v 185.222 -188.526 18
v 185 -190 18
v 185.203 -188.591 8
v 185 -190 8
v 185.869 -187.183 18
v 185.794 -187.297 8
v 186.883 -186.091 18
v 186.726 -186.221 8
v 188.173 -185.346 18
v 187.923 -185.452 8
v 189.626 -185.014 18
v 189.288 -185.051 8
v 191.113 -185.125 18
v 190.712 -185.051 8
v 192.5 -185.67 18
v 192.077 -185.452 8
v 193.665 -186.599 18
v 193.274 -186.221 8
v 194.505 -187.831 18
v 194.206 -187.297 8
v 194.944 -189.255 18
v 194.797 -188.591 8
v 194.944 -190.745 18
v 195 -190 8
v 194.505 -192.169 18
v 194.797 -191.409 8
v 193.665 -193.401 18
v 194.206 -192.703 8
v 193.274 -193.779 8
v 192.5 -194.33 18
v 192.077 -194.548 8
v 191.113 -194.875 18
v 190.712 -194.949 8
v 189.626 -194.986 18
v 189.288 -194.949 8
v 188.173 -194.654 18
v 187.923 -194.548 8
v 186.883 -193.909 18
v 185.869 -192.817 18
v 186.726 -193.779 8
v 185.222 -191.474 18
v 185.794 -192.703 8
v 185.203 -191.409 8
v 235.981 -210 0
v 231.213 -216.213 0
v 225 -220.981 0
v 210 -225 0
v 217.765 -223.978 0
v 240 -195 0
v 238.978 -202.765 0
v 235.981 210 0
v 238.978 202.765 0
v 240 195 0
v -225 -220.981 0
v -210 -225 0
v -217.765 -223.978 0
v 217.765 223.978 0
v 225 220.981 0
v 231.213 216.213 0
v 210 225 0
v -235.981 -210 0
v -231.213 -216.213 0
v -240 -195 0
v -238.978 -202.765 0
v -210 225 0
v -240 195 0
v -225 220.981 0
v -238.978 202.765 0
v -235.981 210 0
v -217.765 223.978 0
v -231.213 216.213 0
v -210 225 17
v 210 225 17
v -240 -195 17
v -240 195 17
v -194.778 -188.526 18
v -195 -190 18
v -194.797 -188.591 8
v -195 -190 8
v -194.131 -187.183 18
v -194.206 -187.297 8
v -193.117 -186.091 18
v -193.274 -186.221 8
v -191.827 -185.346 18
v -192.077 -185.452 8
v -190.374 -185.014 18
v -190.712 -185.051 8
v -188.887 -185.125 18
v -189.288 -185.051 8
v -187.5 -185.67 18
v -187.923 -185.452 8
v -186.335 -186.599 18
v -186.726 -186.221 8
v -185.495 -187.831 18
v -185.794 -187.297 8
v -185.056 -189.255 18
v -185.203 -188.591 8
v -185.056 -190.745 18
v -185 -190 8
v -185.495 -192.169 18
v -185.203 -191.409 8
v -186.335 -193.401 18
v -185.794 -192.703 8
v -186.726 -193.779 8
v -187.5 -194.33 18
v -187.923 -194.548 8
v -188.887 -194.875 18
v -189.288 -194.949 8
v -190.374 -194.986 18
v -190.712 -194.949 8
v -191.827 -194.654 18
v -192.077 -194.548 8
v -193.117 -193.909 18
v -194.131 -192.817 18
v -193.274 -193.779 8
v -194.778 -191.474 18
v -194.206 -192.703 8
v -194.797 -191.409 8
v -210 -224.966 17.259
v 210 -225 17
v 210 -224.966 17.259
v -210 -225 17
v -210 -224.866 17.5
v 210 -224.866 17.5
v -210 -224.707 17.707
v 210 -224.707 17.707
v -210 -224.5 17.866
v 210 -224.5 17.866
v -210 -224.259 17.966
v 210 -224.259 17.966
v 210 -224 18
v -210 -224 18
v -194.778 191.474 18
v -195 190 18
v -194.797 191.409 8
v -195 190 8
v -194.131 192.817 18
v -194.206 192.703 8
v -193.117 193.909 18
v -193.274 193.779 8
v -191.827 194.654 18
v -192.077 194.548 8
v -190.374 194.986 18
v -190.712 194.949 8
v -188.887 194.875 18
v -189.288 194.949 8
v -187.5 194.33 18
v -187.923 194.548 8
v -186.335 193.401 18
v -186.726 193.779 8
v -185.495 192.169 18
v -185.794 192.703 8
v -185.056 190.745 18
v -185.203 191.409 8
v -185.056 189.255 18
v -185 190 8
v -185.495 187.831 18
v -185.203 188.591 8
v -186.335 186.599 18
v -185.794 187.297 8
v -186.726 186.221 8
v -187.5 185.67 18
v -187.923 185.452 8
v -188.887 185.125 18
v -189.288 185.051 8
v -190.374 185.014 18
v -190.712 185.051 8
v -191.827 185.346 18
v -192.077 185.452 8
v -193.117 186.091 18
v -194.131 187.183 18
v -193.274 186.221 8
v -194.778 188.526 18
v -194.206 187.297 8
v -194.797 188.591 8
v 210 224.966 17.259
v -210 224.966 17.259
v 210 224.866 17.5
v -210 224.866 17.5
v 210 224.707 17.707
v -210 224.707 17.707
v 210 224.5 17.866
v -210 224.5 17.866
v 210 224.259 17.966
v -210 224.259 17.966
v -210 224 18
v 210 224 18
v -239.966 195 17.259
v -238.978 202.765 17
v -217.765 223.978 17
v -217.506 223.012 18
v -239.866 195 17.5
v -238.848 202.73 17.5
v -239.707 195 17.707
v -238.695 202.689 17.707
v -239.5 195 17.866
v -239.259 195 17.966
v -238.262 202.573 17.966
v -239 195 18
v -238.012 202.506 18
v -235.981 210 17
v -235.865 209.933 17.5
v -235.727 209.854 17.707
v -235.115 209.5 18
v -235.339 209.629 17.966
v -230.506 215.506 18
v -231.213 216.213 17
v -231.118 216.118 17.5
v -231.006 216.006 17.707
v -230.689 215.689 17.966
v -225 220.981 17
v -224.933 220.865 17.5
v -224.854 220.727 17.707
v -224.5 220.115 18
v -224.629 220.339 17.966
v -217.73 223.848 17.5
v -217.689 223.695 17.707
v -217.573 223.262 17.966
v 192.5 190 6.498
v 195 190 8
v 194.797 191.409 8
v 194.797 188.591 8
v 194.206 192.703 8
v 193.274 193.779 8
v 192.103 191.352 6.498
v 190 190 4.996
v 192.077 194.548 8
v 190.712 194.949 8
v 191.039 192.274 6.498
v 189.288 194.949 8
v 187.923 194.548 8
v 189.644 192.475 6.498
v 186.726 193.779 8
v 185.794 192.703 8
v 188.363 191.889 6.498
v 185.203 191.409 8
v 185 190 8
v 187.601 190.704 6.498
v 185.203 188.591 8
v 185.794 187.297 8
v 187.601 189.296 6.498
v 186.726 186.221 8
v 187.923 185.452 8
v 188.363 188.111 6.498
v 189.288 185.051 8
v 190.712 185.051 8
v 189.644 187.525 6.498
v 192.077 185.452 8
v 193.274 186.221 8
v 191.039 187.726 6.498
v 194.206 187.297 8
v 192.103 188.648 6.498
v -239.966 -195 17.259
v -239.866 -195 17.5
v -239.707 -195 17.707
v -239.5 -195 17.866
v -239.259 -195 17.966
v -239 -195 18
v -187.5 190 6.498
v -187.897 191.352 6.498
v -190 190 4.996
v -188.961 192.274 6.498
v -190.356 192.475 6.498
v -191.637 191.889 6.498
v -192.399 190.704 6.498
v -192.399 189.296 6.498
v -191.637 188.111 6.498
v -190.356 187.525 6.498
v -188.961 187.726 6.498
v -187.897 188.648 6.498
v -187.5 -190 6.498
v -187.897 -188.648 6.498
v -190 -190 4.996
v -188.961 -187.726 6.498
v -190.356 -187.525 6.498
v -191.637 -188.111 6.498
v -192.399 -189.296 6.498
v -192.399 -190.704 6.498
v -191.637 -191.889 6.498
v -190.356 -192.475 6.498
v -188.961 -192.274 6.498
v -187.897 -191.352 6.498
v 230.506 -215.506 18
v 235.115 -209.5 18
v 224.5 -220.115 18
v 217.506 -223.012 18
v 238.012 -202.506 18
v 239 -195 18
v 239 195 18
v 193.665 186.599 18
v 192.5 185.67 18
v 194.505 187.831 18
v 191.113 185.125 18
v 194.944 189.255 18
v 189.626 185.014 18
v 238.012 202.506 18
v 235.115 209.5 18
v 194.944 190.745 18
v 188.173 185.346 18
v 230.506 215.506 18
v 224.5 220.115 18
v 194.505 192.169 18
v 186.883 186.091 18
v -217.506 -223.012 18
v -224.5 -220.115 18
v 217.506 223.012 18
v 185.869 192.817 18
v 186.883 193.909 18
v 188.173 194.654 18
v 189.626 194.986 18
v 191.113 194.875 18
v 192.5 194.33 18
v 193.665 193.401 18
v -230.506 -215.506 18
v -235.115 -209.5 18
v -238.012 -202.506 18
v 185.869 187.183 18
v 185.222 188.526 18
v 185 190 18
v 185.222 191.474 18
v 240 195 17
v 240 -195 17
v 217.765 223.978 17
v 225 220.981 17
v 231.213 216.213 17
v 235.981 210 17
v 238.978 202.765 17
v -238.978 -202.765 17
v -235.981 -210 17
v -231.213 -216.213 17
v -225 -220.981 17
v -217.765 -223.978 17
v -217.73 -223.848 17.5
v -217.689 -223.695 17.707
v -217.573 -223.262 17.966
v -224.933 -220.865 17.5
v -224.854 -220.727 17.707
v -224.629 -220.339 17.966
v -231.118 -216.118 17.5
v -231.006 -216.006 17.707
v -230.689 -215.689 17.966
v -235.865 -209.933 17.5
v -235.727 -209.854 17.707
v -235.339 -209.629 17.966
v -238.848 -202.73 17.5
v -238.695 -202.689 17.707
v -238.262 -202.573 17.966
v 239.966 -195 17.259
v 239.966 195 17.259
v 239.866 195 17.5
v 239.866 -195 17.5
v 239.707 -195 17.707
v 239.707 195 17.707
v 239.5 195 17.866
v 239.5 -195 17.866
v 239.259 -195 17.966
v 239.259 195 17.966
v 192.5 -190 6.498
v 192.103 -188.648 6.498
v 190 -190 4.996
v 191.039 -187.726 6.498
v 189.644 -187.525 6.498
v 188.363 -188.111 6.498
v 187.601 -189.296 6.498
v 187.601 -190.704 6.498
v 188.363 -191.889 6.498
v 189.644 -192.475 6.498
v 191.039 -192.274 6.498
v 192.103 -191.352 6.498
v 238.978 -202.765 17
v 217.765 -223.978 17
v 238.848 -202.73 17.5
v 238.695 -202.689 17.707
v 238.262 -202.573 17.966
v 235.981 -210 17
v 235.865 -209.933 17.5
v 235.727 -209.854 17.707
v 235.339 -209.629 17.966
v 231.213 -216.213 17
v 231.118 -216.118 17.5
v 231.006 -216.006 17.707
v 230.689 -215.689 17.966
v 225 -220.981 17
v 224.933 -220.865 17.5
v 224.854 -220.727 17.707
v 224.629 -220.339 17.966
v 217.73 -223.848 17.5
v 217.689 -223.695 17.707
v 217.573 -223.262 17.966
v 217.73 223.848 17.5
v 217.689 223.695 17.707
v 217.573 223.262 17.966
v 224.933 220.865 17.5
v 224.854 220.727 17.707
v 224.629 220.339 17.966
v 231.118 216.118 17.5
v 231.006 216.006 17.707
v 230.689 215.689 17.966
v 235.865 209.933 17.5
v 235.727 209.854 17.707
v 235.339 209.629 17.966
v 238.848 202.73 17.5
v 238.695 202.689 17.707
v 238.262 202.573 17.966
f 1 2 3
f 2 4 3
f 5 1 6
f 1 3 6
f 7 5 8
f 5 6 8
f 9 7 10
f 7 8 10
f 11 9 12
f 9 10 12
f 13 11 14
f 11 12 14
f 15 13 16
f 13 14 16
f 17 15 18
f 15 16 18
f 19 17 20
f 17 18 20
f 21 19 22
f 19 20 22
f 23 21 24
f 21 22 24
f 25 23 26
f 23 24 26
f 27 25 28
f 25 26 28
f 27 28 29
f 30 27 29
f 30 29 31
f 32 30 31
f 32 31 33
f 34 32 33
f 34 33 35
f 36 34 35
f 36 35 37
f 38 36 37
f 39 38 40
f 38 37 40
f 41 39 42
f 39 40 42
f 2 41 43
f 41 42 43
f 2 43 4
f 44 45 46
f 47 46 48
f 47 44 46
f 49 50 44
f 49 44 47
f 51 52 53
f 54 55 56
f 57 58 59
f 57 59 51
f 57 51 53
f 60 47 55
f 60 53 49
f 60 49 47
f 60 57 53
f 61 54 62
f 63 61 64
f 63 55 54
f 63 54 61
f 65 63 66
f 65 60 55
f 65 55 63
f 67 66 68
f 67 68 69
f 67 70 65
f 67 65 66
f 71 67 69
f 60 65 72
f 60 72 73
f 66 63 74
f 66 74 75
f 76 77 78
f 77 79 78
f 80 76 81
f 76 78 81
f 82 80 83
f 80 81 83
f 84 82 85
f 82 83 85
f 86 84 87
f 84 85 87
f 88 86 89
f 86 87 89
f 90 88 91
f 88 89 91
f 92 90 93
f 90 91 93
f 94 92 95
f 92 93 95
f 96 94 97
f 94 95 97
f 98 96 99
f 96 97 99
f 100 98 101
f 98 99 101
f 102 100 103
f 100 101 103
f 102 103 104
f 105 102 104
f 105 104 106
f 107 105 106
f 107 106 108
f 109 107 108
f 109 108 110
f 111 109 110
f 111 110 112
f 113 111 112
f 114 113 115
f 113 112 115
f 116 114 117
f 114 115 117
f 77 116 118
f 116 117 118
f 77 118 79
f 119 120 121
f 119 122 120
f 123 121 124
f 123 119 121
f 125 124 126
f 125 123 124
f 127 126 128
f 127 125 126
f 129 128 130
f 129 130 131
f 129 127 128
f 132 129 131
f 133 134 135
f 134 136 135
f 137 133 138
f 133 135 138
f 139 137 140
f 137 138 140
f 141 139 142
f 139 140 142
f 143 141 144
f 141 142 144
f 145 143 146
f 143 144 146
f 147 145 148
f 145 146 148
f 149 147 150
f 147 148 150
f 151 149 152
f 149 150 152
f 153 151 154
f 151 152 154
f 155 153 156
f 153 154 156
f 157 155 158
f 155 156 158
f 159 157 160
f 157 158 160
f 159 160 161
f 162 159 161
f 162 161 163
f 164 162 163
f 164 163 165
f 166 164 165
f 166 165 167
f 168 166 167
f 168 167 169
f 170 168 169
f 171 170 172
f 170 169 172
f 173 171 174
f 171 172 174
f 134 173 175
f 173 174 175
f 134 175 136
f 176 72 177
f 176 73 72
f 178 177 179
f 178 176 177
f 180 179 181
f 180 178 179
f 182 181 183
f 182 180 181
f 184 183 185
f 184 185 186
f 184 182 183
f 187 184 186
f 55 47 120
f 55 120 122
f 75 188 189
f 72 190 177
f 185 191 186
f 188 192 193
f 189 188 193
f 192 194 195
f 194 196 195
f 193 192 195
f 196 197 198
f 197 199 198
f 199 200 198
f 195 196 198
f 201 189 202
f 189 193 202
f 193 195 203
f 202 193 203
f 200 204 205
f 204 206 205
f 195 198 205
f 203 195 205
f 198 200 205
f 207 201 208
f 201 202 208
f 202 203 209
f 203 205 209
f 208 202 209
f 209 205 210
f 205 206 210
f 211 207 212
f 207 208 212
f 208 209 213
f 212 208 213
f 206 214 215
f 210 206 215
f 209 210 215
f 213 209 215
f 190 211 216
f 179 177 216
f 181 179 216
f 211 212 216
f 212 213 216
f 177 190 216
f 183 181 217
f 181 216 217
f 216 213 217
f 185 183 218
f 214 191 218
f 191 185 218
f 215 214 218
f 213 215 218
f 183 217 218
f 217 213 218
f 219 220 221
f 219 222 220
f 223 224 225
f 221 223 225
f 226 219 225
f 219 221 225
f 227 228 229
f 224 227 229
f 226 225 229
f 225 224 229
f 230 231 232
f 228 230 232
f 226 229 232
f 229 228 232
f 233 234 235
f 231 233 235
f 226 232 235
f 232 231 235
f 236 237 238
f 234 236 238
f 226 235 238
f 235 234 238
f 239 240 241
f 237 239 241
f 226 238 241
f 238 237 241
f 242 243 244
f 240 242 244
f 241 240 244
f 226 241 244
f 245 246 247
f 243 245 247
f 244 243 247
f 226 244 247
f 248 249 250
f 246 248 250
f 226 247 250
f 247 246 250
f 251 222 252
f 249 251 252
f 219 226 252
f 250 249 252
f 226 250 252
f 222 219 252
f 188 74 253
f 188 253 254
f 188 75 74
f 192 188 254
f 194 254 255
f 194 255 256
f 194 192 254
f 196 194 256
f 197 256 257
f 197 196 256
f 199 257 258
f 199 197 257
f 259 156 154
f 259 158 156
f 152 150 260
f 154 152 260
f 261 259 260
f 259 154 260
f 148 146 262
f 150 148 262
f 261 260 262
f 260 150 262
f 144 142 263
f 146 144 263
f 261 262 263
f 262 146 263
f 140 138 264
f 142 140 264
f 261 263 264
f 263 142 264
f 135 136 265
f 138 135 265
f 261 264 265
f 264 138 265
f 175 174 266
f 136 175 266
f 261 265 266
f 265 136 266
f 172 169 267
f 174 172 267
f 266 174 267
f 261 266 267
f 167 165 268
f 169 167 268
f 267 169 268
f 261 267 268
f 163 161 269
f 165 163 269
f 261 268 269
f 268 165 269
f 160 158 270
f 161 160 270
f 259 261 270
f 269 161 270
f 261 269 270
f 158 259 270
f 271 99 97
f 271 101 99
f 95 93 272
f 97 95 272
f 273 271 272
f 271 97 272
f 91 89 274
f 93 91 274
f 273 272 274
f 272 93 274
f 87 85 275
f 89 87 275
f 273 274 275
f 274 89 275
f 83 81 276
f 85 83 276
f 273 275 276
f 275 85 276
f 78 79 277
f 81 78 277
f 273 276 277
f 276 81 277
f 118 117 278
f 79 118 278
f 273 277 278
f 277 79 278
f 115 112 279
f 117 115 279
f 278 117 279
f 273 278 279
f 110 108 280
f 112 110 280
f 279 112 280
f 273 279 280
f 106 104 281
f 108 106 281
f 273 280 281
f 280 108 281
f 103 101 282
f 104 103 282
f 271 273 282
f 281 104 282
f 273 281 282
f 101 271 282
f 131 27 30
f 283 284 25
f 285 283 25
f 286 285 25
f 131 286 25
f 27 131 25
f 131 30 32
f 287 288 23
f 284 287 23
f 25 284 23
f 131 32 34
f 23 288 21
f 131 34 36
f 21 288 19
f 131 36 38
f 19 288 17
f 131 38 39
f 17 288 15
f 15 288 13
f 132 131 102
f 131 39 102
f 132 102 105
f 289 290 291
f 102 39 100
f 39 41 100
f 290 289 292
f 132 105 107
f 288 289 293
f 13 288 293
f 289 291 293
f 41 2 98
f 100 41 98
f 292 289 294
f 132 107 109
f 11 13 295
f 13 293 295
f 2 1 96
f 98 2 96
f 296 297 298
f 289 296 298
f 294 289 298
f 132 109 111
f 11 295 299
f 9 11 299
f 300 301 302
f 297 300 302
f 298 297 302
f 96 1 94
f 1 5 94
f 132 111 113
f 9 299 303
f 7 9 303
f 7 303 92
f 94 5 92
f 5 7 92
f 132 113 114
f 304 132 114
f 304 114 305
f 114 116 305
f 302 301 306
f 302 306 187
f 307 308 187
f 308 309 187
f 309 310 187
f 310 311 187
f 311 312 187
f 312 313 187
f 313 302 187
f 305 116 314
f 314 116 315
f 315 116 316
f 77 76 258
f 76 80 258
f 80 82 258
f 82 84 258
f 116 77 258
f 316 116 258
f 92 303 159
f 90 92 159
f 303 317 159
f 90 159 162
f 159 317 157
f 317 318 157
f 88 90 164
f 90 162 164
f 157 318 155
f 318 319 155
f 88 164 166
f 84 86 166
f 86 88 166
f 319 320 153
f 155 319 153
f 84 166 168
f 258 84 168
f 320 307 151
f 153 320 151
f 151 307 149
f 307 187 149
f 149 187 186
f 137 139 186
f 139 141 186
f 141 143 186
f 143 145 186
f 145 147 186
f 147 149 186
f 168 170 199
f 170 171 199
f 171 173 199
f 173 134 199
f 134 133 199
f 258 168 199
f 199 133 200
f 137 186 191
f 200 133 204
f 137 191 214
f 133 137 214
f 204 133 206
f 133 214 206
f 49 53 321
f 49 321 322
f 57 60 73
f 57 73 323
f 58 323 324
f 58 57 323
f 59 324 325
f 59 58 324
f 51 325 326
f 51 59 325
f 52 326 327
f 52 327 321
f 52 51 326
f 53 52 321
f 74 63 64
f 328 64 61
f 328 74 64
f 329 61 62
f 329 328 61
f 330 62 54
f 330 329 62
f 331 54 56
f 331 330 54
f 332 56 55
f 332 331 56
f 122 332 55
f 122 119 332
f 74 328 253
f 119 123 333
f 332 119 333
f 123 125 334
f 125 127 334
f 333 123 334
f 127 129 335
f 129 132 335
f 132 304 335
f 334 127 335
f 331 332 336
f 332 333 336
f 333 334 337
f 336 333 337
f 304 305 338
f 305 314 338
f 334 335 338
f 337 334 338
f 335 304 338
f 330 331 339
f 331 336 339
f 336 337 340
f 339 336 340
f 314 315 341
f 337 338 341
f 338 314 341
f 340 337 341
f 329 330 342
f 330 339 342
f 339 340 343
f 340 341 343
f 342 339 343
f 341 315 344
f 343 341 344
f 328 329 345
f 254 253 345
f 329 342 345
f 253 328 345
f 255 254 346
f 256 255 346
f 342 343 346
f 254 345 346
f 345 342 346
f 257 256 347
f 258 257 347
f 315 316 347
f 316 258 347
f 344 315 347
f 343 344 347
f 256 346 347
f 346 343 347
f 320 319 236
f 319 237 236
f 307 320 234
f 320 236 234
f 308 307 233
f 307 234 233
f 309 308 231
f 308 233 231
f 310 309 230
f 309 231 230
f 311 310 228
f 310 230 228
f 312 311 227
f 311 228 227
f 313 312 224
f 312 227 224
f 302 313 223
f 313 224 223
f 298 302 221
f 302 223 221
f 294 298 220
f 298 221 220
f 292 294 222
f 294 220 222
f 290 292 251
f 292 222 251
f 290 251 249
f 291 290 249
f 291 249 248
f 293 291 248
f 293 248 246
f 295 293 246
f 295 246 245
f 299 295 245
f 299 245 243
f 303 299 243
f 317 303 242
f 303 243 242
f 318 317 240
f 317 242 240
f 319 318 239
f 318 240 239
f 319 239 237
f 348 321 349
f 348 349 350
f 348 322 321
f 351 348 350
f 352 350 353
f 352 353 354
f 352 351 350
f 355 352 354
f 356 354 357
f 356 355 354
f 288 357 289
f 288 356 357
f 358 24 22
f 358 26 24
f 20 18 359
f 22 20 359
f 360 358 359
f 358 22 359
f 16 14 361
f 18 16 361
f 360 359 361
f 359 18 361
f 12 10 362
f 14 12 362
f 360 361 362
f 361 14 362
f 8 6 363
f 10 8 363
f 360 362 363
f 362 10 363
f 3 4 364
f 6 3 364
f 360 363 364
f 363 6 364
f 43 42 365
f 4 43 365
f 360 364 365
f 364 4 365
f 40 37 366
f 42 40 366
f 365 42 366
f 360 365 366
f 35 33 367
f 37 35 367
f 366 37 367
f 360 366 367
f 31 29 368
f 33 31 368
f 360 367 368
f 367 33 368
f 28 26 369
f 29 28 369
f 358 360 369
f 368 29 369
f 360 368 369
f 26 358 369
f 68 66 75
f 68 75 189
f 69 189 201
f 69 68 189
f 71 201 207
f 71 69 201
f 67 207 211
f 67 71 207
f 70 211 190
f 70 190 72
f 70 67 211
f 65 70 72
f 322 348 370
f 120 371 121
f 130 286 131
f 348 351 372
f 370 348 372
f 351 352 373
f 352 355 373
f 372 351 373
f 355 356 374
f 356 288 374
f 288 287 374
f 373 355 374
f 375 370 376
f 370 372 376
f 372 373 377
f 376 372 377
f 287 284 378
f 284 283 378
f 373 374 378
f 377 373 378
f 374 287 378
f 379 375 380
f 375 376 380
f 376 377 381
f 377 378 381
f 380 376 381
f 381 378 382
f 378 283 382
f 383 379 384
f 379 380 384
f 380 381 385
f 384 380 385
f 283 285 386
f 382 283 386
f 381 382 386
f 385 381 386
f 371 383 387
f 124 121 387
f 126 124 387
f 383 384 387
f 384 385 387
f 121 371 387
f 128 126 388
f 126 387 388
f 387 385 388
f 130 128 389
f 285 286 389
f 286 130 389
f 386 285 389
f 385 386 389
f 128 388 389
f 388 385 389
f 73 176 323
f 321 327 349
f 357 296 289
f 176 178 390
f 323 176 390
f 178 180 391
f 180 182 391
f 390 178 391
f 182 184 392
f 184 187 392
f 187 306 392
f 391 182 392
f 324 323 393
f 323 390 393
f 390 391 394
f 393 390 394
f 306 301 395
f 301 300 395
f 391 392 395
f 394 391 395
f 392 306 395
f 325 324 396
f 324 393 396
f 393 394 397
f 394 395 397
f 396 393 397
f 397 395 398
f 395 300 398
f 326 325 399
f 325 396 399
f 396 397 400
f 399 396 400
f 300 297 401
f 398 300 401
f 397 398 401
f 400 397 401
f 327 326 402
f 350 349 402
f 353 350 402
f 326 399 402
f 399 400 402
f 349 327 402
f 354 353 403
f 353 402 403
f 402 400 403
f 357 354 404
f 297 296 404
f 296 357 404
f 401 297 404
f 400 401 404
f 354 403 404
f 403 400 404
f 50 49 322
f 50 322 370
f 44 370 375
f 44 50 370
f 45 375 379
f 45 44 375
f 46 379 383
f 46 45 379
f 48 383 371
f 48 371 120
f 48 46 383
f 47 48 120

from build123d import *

# Parameters (mm, degrees)
P_IDAT_VYSUNUT_M1_DEPTH      = 18
D_RY_PRO_KOL_K_10_0MM1_D     = 10
D_RY_PRO_KOL_K_10_0MM1_DEPTH = 10
D_RY_PRO_KOL_K_10_0MM1_TIP   = 3.004303095
ZAOBLIT1_R                   = 30
ZAOBLIT2_R                   = 1


with BuildPart() as part:
    # Skica1 → Přidat vysunutím1 (new body)
    with BuildSketch(Plane.XY):
        with BuildLine():
            Line((-210, 225), (210, 225))
            ThreePointArc((210, 225), (231.213203436, 216.213203436), (240, 195))
            Line((240, 195), (240, -195))
            ThreePointArc((240, -195), (231.213203436, -216.213203436), (210, -225))
            Line((210, -225), (-240, -225))
            Line((-240, -225), (-240, 195))
            ThreePointArc((-240, 195), (-231.213203436, 216.213203436), (-210, 225))
        make_face()
    extrude(amount=P_IDAT_VYSUNUT_M1_DEPTH)

    # Díry pro kolík, Ø10.0mm1
    with Locations(Plane.XY.offset(18)):
        with Locations((-190, 190), (190, 190), (190, -190), (-190, -190)):
            Hole(D_RY_PRO_KOL_K_10_0MM1_D / 2, depth=D_RY_PRO_KOL_K_10_0MM1_DEPTH)
            with Locations((0, 0, -(D_RY_PRO_KOL_K_10_0MM1_DEPTH + D_RY_PRO_KOL_K_10_0MM1_TIP / 2))):  # 118° drill point
                Cone(0, D_RY_PRO_KOL_K_10_0MM1_D / 2, D_RY_PRO_KOL_K_10_0MM1_TIP, mode=Mode.SUBTRACT)

    # Zaoblit1
    zaoblit1_edges = [part.edges().sort_by_distance(p)[0] for p in [
        (-240, -225, 9),
    ]]
    fillet(zaoblit1_edges, radius=ZAOBLIT1_R)

    # Zaoblit2
    zaoblit2_edges = [part.edges().sort_by_distance(p)[0] for p in [
        (240, 0, 18),
        (231.213203436, 216.213203436, 18),
        (0, 225, 18),
        (-231.213203436, 216.213203436, 18),
        (-240, 0, 18),
        (0, -225, 18),
        (-231.213203436, -216.213203436, 18),
        (231.213203436, -216.213203436, 18),
    ]]
    fillet(zaoblit2_edges, radius=ZAOBLIT2_R)


solid = part.part
